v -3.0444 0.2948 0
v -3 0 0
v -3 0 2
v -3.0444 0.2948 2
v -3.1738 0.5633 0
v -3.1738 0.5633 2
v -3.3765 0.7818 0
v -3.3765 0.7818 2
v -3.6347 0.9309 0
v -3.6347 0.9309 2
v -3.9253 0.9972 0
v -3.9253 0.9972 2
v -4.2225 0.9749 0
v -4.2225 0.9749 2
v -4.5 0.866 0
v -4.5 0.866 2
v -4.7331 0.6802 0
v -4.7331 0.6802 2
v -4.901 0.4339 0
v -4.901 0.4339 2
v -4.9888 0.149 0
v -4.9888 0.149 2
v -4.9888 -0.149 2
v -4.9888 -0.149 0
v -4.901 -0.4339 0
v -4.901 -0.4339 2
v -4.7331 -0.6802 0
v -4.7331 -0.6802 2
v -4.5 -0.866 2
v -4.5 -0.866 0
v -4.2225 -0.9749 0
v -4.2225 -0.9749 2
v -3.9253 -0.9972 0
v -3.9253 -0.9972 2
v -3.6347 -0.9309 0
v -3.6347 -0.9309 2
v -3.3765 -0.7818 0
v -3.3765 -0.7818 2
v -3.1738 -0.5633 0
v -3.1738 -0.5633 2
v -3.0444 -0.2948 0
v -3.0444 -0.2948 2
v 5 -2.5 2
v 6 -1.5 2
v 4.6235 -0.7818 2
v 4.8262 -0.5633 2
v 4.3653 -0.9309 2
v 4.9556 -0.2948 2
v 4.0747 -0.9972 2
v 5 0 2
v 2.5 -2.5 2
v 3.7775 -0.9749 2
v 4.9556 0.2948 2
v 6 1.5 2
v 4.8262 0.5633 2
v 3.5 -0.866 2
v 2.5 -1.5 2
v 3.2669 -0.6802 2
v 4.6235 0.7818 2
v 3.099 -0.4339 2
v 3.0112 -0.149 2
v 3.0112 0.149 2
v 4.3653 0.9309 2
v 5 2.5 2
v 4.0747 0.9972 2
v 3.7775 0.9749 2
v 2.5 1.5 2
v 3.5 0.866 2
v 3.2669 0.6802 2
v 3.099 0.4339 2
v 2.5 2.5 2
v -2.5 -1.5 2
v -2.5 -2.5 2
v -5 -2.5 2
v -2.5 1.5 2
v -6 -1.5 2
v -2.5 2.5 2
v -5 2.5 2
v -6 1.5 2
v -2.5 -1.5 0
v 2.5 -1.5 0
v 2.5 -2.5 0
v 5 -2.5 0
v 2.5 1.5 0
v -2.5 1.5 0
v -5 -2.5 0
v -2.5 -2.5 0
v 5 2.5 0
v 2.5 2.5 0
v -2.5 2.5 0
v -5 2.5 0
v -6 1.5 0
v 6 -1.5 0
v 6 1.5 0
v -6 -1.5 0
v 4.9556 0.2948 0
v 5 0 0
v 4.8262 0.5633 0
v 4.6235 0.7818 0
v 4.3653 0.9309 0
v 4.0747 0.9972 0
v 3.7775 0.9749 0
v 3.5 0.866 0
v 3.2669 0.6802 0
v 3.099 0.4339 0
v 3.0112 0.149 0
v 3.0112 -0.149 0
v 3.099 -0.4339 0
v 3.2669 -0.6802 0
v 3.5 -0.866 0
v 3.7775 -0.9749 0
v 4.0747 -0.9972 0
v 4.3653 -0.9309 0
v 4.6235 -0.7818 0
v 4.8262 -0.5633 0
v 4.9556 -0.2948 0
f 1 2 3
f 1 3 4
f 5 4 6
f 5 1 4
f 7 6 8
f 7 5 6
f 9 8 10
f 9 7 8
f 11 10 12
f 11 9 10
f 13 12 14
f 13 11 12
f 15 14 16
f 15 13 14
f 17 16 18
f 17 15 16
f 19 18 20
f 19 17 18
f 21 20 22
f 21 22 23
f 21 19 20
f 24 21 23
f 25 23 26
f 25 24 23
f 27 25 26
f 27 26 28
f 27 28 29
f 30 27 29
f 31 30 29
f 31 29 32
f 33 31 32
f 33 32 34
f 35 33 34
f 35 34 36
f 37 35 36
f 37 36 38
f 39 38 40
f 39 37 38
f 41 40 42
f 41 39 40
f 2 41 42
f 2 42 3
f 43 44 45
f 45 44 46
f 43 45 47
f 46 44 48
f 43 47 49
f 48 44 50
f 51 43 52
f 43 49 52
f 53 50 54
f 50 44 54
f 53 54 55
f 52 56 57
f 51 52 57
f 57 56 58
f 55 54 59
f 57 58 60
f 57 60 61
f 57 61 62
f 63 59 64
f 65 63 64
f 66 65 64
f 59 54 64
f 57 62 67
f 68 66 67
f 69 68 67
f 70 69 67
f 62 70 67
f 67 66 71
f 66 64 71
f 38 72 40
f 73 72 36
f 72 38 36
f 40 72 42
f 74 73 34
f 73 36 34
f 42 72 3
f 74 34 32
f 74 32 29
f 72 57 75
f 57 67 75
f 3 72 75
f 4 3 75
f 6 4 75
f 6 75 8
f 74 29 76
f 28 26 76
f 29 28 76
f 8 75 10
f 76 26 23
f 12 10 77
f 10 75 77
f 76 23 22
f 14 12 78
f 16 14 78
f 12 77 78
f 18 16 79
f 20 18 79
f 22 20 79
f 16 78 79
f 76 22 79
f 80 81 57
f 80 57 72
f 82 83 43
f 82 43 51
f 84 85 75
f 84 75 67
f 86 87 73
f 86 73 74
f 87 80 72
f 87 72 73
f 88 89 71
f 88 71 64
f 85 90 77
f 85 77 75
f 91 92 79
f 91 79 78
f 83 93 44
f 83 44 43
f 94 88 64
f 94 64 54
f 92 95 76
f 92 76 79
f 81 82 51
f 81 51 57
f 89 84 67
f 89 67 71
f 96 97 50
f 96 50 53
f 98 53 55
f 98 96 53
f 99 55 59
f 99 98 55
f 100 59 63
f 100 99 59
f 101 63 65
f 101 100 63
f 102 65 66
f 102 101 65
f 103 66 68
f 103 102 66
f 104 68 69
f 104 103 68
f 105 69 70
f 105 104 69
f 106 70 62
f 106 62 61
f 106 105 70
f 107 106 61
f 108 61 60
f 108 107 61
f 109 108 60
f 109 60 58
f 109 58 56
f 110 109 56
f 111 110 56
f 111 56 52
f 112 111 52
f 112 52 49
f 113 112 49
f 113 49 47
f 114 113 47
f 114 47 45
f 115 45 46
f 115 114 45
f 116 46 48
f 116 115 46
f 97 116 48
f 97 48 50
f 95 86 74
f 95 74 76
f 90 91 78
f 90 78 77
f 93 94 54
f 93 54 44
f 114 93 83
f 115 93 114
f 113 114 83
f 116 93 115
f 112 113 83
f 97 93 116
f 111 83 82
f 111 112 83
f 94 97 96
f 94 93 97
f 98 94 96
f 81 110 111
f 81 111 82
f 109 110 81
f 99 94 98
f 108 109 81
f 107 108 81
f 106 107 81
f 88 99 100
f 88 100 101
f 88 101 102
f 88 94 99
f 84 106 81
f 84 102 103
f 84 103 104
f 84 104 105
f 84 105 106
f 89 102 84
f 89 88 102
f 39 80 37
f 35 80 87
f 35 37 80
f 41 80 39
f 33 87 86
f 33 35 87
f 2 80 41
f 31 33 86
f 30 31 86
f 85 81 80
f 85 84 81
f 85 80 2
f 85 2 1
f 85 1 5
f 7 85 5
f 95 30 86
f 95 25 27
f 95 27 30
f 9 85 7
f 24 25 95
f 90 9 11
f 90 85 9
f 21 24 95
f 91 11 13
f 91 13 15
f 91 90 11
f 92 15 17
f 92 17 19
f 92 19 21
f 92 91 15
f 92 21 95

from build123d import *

# Parameters (mm, degrees)
SKETCH_1_R      = 1
EXTRUDE_1_DEPTH = 2


with BuildPart() as part:
    # 草图1 → 凸台-拉伸1 (new body)
    with BuildSketch(Plane.XY):
        Polygon((-2.5, 2.5), (-2.5, 1.5), (2.5, 1.5), (2.5, 2.5), (5, 2.5), (6, 1.5), (6, -1.5), (5, -2.5), (2.5, -2.5), (2.5, -1.5), (-2.5, -1.5), (-2.5, -2.5), (-5, -2.5), (-6, -1.5), (-6, 1.5), (-5, 2.5), align=None)
        with Locations((-4, 0)):
            Circle(SKETCH_1_R, mode=Mode.SUBTRACT)
        with Locations((4, 0)):
            Circle(SKETCH_1_R, mode=Mode.SUBTRACT)
    extrude(amount=EXTRUDE_1_DEPTH)


solid = part.part
